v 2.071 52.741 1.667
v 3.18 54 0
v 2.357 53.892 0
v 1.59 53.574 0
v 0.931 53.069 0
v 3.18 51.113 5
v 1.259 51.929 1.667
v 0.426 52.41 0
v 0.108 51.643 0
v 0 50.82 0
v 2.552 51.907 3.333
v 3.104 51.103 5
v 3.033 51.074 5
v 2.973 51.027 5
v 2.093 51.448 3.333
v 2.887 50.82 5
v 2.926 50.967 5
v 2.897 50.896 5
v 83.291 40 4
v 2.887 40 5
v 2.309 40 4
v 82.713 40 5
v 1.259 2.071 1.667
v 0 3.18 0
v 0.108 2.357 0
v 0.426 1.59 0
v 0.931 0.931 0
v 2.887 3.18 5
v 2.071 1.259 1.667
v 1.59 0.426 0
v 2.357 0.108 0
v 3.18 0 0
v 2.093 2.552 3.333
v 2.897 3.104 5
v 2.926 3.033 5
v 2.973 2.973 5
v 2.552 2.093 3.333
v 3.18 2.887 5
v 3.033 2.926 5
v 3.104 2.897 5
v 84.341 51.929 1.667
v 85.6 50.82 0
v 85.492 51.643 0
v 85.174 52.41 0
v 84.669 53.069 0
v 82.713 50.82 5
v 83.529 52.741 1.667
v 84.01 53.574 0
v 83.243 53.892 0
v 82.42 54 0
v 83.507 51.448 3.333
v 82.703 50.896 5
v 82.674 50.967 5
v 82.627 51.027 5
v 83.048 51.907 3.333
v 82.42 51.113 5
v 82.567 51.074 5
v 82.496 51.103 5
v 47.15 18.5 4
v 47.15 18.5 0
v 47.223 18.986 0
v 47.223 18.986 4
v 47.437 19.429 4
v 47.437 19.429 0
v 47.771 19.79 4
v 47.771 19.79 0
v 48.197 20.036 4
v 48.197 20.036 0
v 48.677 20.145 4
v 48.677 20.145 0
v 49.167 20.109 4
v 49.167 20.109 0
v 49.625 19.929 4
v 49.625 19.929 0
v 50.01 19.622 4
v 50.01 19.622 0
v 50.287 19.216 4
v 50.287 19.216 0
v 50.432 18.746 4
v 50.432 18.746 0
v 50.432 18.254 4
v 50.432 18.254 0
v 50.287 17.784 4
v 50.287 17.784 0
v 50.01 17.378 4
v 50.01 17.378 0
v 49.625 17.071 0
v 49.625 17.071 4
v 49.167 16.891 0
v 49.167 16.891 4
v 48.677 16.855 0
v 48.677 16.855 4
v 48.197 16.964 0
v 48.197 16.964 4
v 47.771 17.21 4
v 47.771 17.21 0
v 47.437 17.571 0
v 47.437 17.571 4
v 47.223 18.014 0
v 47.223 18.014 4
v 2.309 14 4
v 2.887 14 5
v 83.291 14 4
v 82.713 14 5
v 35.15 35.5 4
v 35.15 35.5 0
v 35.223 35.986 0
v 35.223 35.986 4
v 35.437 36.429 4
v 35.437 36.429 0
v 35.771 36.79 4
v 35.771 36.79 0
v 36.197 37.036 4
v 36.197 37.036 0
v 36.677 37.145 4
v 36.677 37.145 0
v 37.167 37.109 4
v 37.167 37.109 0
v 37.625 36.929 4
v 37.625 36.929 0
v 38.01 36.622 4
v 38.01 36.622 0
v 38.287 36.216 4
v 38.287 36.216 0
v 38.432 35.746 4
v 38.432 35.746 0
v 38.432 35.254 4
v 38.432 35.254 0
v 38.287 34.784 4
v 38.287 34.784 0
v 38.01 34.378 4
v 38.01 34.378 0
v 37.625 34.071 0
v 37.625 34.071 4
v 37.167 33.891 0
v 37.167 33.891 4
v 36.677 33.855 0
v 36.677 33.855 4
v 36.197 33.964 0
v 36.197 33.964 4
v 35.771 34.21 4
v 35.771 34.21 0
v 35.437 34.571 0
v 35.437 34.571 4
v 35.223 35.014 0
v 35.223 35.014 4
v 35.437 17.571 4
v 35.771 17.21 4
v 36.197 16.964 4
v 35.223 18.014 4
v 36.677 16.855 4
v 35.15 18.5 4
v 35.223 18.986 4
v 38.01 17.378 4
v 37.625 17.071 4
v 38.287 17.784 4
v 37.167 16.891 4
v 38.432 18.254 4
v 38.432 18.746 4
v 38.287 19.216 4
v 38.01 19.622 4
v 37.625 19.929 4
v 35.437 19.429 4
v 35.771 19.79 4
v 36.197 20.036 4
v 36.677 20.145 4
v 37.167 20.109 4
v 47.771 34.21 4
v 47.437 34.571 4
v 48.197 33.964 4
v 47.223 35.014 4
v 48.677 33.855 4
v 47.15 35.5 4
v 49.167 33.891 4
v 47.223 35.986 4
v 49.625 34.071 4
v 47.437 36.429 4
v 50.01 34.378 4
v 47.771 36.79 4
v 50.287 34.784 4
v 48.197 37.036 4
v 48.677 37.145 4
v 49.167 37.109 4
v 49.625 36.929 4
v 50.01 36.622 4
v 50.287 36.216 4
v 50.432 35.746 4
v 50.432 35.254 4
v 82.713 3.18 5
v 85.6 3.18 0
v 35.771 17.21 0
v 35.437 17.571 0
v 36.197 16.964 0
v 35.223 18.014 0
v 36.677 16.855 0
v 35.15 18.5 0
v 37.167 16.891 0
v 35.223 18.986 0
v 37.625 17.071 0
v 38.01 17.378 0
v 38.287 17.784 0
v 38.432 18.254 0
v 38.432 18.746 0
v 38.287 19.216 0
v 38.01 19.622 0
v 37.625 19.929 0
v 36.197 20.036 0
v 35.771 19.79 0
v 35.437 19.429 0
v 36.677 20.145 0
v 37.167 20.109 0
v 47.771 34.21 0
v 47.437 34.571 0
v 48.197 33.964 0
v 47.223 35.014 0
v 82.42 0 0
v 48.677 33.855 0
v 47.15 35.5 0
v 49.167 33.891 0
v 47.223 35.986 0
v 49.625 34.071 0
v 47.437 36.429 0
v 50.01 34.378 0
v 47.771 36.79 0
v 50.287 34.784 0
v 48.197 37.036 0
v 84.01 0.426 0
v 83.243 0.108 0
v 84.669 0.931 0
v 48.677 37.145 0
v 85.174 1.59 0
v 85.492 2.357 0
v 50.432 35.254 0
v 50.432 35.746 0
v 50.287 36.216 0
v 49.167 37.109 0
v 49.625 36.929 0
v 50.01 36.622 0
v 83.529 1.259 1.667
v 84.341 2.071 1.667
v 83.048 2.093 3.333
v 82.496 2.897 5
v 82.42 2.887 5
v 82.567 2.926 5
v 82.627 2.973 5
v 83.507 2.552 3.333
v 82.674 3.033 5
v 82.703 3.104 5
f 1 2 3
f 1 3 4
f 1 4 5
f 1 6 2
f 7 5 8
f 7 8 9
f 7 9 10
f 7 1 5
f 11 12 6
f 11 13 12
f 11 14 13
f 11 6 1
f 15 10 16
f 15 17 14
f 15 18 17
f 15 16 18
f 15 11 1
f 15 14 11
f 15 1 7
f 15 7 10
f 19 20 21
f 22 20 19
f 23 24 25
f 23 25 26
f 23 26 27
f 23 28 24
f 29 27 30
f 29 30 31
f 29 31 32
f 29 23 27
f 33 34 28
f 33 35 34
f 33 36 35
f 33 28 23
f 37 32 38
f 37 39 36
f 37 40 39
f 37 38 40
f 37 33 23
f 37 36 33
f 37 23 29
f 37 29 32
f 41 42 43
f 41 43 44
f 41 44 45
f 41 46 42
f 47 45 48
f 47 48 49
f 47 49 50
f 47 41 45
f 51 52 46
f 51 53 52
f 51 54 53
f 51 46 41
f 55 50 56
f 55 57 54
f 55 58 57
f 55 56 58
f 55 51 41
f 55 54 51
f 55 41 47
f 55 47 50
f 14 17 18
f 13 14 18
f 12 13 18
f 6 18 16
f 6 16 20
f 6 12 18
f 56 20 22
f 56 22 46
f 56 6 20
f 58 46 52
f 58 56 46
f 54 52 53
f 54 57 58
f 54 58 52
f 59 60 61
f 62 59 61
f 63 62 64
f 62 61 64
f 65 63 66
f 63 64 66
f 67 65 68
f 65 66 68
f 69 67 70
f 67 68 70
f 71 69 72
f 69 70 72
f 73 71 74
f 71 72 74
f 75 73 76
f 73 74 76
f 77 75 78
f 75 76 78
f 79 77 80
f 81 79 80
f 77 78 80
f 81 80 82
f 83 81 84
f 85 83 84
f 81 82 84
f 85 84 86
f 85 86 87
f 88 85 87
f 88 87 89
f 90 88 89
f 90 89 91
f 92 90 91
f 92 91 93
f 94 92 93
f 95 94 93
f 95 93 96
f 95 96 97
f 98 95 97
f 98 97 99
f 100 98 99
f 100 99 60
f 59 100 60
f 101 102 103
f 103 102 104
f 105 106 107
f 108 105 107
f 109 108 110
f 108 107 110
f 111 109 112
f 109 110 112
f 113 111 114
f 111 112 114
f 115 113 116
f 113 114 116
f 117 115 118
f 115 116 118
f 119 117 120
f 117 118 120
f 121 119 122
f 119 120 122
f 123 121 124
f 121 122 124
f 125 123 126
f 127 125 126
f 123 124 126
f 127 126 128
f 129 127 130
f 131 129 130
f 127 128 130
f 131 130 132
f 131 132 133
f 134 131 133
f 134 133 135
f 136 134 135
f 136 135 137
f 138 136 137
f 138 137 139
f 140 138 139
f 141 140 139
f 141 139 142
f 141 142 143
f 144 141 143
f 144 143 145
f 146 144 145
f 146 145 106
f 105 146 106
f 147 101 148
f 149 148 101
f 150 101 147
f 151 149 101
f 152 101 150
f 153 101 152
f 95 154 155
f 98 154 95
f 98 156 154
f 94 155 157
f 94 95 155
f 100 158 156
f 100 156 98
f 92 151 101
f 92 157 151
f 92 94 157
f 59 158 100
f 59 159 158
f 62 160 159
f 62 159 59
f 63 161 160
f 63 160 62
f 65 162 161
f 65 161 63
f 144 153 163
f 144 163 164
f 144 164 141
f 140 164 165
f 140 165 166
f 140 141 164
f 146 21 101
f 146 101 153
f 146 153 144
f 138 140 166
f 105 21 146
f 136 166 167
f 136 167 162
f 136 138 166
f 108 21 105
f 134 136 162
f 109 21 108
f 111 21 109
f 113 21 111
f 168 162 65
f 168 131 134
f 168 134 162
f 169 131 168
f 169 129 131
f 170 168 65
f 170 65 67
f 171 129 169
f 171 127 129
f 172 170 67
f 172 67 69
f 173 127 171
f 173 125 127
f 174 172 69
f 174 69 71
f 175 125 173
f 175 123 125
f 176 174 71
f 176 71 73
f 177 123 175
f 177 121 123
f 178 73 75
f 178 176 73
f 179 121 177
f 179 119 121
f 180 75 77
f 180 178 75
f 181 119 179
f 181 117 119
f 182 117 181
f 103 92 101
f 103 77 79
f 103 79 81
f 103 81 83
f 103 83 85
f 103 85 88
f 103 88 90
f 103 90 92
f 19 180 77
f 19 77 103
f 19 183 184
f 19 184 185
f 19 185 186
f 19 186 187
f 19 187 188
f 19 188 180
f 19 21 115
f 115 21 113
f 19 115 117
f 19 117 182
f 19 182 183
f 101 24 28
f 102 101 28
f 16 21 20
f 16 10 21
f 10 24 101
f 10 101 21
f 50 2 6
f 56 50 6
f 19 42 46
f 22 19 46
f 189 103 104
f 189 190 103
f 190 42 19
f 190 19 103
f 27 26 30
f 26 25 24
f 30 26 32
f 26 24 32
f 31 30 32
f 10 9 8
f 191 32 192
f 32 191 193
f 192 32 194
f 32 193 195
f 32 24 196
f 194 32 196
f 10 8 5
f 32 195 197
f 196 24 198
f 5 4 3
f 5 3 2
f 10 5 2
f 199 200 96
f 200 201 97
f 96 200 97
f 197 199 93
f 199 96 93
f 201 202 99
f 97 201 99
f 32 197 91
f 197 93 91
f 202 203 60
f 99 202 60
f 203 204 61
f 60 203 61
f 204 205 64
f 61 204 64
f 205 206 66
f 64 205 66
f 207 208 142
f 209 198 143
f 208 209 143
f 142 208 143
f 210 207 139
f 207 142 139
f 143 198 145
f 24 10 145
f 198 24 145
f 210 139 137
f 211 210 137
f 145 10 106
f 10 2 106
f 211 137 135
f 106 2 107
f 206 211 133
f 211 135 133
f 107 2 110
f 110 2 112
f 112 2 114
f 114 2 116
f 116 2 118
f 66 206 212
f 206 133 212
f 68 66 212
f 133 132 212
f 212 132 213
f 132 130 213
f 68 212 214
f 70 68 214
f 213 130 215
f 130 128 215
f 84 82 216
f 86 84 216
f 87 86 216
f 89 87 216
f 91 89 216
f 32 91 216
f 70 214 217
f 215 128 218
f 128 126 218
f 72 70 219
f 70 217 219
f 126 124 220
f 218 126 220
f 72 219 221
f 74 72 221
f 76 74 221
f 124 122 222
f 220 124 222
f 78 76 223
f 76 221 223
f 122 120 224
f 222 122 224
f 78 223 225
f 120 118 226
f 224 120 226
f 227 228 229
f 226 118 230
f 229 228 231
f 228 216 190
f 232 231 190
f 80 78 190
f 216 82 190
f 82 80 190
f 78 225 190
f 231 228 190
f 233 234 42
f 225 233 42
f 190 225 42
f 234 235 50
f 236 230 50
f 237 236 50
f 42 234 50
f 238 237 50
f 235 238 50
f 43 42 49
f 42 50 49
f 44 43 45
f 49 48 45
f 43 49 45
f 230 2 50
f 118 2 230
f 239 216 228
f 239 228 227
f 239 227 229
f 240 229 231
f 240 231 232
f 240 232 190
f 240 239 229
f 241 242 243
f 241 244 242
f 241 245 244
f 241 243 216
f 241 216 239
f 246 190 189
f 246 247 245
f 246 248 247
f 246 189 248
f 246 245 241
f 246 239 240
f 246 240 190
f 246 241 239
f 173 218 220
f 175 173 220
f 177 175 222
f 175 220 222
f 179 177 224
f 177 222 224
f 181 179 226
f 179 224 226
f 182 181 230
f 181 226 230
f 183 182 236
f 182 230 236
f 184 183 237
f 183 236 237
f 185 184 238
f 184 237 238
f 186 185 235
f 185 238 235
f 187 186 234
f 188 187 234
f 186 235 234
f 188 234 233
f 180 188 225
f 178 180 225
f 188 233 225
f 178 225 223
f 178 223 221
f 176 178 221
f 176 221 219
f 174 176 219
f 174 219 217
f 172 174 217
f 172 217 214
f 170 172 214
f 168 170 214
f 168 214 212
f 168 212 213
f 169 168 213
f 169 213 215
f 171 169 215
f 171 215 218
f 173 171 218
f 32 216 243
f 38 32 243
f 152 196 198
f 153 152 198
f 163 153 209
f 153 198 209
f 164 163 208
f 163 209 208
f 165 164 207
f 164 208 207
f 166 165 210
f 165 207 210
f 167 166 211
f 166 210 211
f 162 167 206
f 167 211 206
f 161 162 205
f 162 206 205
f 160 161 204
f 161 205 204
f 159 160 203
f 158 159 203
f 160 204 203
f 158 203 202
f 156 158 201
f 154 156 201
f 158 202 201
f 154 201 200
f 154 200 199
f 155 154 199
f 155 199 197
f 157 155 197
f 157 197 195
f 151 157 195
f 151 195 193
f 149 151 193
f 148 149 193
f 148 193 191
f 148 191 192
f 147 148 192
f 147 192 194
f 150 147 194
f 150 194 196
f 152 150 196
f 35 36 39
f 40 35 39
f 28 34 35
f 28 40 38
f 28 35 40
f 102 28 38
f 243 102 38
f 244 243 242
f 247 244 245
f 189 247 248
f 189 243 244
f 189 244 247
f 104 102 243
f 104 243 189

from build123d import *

# Parameters (mm, degrees)
EXTRUDE_1_DEPTH        = 5
CHAMFER_2_SIZE         = 5
CHAMFER_2_SIZE_2       = 2.886751346
SKETCH_5_W             = 92.306776668
SKETCH_5_H             = 26
CUT_EXTRUDE_2_DEPTH    = 1
SKETCH_6_W             = 1
SKETCH_6_H             = 26
CUT_EXTRUDE_3_DEPTH    = 5
HOLE_WIZARD_M4_3_D     = 3.3
HOLE_WIZARD_M4_3_DEPTH = 10.1
HOLE_WIZARD_M4_3_TIP   = 0.991420021


with BuildPart() as part:
    # 草图1 → 凸台-拉伸1 (new body)
    with BuildSketch(Plane.XY):
        with BuildLine():
            Line((3.18, 0), (82.42, 0))
            ThreePointArc((82.42, 0), (84.668599564, 0.931400436), (85.6, 3.18))
            Line((85.6, 3.18), (85.6, 50.82))
            ThreePointArc((85.6, 50.82), (84.668599564, 53.068599564), (82.42, 54))
            Line((82.42, 54), (3.18, 54))
            ThreePointArc((3.18, 54), (0.931400436, 53.068599564), (0, 50.82))
            Line((0, 50.82), (0, 3.18))
            ThreePointArc((0, 3.18), (0.931400436, 0.931400436), (3.18, 0))
        make_face()
    extrude(amount=EXTRUDE_1_DEPTH)

    # 倒角2
    # the kernel refuses this chamfer: 5, 2.886751346 mm, written as the material it takes off along each edge
    with BuildSketch(Plane(origin=(85.6, 3.18, 5), x_dir=(0.019326765612699606, 0, -0.9998132206222079), z_dir=(0, 1, 0)), Plane(origin=(0, 50.82, 5), x_dir=(-0.019326765612700733, 0, -0.9998132206222079), z_dir=(0, -1, 0))) as chamfer_2_piece_1:
        Polygon((CHAMFER_2_SIZE * 0.999813220622, CHAMFER_2_SIZE * 0.0193267656127), (-CHAMFER_2_SIZE_2 * 0.0193267656124, CHAMFER_2_SIZE_2 * 0.999813220604), (0, 0), align=None)
    extrude(amount=47.64, mode=Mode.SUBTRACT)
    with BuildSketch(Plane(origin=(82.42, 50.82, 5), x_dir=(1, 0, 0), z_dir=(0, -1, 0))) as chamfer_2_piece_2:
        Polygon((3.18, -CHAMFER_2_SIZE), (3.18 - CHAMFER_2_SIZE_2, 0), (3.18, 0), align=None)
    revolve(axis=Axis((82.42, 50.82, 5), (0, 0, 1)), revolution_arc=90, mode=Mode.SUBTRACT)
    with BuildSketch(Plane(origin=(82.42, 3.18, 5), x_dir=(0, -1, 0), z_dir=(-1, 0, 0))) as chamfer_2_piece_3:
        Polygon((3.18, -CHAMFER_2_SIZE), (3.18 - CHAMFER_2_SIZE_2, 0), (3.18, 0), align=None)
    revolve(axis=Axis((82.42, 3.18, 5), (0, 0, 1)), revolution_arc=90, mode=Mode.SUBTRACT)
    with BuildSketch(Plane(origin=(82.42, 54, 5), x_dir=(0, 0.01932676561270098, -0.9998132206222079), z_dir=(-1, 0, 0)), Plane(origin=(3.18, 0, 5), x_dir=(0, -0.019326765612700754, -0.9998132206222079), z_dir=(1, 0, 0))) as chamfer_2_piece_4:
        Polygon((CHAMFER_2_SIZE * 0.999813220622, CHAMFER_2_SIZE * 0.0193267656127), (-CHAMFER_2_SIZE_2 * 0.0193267656124, CHAMFER_2_SIZE_2 * 0.999813220604), (0, 0), align=None)
    extrude(amount=79.24, mode=Mode.SUBTRACT)
    with BuildSketch(Plane(origin=(3.18, 50.82, 5), x_dir=(0, 1, 0), z_dir=(1, 0, 0))) as chamfer_2_piece_5:
        Polygon((3.18, -CHAMFER_2_SIZE), (3.18 - CHAMFER_2_SIZE_2, 0), (3.18, 0), align=None)
    revolve(axis=Axis((3.18, 50.82, 5), (0, 0, 1)), revolution_arc=90, mode=Mode.SUBTRACT)
    with BuildSketch(Plane(origin=(3.18, 3.18, 5), x_dir=(-1, 0, 0), z_dir=(0, 1, 0))) as chamfer_2_piece_6:
        Polygon((3.18, -CHAMFER_2_SIZE), (3.18 - CHAMFER_2_SIZE_2, 0), (3.18, 0), align=None)
    revolve(axis=Axis((3.18, 3.18, 5), (0, 0, 1)), revolution_arc=90, mode=Mode.SUBTRACT)

    # 草图5 → 切除-拉伸2 (cut)
    with BuildSketch(Plane.XY.offset(5)):
        with Locations((49.04013968, 27)):
            Rectangle(SKETCH_5_W, SKETCH_5_H)
    extrude(amount=-CUT_EXTRUDE_2_DEPTH, mode=Mode.SUBTRACT)

    # 草图6 → 切除-拉伸3 (cut)
    with BuildSketch(Plane(origin=(2.886751346, 0, 0), x_dir=(0, 0, -1), z_dir=(1, 0, 0))):
        with Locations((-4.5, 27)):
            Rectangle(SKETCH_6_W, SKETCH_6_H)
    extrude(amount=-CUT_EXTRUDE_3_DEPTH, mode=Mode.SUBTRACT)

    # M4 螺纹孔3
    with Locations(Plane.XY.offset(4)):
        with Locations((48.8, 18.5), (48.8, 35.5), (36.8, 18.5), (36.8, 35.5)):
            Hole(HOLE_WIZARD_M4_3_D / 2, depth=HOLE_WIZARD_M4_3_DEPTH)
            with Locations((0, 0, -(HOLE_WIZARD_M4_3_DEPTH + HOLE_WIZARD_M4_3_TIP / 2))):  # 118° drill point
                Cone(0, HOLE_WIZARD_M4_3_D / 2, HOLE_WIZARD_M4_3_TIP, mode=Mode.SUBTRACT)


solid = part.part
